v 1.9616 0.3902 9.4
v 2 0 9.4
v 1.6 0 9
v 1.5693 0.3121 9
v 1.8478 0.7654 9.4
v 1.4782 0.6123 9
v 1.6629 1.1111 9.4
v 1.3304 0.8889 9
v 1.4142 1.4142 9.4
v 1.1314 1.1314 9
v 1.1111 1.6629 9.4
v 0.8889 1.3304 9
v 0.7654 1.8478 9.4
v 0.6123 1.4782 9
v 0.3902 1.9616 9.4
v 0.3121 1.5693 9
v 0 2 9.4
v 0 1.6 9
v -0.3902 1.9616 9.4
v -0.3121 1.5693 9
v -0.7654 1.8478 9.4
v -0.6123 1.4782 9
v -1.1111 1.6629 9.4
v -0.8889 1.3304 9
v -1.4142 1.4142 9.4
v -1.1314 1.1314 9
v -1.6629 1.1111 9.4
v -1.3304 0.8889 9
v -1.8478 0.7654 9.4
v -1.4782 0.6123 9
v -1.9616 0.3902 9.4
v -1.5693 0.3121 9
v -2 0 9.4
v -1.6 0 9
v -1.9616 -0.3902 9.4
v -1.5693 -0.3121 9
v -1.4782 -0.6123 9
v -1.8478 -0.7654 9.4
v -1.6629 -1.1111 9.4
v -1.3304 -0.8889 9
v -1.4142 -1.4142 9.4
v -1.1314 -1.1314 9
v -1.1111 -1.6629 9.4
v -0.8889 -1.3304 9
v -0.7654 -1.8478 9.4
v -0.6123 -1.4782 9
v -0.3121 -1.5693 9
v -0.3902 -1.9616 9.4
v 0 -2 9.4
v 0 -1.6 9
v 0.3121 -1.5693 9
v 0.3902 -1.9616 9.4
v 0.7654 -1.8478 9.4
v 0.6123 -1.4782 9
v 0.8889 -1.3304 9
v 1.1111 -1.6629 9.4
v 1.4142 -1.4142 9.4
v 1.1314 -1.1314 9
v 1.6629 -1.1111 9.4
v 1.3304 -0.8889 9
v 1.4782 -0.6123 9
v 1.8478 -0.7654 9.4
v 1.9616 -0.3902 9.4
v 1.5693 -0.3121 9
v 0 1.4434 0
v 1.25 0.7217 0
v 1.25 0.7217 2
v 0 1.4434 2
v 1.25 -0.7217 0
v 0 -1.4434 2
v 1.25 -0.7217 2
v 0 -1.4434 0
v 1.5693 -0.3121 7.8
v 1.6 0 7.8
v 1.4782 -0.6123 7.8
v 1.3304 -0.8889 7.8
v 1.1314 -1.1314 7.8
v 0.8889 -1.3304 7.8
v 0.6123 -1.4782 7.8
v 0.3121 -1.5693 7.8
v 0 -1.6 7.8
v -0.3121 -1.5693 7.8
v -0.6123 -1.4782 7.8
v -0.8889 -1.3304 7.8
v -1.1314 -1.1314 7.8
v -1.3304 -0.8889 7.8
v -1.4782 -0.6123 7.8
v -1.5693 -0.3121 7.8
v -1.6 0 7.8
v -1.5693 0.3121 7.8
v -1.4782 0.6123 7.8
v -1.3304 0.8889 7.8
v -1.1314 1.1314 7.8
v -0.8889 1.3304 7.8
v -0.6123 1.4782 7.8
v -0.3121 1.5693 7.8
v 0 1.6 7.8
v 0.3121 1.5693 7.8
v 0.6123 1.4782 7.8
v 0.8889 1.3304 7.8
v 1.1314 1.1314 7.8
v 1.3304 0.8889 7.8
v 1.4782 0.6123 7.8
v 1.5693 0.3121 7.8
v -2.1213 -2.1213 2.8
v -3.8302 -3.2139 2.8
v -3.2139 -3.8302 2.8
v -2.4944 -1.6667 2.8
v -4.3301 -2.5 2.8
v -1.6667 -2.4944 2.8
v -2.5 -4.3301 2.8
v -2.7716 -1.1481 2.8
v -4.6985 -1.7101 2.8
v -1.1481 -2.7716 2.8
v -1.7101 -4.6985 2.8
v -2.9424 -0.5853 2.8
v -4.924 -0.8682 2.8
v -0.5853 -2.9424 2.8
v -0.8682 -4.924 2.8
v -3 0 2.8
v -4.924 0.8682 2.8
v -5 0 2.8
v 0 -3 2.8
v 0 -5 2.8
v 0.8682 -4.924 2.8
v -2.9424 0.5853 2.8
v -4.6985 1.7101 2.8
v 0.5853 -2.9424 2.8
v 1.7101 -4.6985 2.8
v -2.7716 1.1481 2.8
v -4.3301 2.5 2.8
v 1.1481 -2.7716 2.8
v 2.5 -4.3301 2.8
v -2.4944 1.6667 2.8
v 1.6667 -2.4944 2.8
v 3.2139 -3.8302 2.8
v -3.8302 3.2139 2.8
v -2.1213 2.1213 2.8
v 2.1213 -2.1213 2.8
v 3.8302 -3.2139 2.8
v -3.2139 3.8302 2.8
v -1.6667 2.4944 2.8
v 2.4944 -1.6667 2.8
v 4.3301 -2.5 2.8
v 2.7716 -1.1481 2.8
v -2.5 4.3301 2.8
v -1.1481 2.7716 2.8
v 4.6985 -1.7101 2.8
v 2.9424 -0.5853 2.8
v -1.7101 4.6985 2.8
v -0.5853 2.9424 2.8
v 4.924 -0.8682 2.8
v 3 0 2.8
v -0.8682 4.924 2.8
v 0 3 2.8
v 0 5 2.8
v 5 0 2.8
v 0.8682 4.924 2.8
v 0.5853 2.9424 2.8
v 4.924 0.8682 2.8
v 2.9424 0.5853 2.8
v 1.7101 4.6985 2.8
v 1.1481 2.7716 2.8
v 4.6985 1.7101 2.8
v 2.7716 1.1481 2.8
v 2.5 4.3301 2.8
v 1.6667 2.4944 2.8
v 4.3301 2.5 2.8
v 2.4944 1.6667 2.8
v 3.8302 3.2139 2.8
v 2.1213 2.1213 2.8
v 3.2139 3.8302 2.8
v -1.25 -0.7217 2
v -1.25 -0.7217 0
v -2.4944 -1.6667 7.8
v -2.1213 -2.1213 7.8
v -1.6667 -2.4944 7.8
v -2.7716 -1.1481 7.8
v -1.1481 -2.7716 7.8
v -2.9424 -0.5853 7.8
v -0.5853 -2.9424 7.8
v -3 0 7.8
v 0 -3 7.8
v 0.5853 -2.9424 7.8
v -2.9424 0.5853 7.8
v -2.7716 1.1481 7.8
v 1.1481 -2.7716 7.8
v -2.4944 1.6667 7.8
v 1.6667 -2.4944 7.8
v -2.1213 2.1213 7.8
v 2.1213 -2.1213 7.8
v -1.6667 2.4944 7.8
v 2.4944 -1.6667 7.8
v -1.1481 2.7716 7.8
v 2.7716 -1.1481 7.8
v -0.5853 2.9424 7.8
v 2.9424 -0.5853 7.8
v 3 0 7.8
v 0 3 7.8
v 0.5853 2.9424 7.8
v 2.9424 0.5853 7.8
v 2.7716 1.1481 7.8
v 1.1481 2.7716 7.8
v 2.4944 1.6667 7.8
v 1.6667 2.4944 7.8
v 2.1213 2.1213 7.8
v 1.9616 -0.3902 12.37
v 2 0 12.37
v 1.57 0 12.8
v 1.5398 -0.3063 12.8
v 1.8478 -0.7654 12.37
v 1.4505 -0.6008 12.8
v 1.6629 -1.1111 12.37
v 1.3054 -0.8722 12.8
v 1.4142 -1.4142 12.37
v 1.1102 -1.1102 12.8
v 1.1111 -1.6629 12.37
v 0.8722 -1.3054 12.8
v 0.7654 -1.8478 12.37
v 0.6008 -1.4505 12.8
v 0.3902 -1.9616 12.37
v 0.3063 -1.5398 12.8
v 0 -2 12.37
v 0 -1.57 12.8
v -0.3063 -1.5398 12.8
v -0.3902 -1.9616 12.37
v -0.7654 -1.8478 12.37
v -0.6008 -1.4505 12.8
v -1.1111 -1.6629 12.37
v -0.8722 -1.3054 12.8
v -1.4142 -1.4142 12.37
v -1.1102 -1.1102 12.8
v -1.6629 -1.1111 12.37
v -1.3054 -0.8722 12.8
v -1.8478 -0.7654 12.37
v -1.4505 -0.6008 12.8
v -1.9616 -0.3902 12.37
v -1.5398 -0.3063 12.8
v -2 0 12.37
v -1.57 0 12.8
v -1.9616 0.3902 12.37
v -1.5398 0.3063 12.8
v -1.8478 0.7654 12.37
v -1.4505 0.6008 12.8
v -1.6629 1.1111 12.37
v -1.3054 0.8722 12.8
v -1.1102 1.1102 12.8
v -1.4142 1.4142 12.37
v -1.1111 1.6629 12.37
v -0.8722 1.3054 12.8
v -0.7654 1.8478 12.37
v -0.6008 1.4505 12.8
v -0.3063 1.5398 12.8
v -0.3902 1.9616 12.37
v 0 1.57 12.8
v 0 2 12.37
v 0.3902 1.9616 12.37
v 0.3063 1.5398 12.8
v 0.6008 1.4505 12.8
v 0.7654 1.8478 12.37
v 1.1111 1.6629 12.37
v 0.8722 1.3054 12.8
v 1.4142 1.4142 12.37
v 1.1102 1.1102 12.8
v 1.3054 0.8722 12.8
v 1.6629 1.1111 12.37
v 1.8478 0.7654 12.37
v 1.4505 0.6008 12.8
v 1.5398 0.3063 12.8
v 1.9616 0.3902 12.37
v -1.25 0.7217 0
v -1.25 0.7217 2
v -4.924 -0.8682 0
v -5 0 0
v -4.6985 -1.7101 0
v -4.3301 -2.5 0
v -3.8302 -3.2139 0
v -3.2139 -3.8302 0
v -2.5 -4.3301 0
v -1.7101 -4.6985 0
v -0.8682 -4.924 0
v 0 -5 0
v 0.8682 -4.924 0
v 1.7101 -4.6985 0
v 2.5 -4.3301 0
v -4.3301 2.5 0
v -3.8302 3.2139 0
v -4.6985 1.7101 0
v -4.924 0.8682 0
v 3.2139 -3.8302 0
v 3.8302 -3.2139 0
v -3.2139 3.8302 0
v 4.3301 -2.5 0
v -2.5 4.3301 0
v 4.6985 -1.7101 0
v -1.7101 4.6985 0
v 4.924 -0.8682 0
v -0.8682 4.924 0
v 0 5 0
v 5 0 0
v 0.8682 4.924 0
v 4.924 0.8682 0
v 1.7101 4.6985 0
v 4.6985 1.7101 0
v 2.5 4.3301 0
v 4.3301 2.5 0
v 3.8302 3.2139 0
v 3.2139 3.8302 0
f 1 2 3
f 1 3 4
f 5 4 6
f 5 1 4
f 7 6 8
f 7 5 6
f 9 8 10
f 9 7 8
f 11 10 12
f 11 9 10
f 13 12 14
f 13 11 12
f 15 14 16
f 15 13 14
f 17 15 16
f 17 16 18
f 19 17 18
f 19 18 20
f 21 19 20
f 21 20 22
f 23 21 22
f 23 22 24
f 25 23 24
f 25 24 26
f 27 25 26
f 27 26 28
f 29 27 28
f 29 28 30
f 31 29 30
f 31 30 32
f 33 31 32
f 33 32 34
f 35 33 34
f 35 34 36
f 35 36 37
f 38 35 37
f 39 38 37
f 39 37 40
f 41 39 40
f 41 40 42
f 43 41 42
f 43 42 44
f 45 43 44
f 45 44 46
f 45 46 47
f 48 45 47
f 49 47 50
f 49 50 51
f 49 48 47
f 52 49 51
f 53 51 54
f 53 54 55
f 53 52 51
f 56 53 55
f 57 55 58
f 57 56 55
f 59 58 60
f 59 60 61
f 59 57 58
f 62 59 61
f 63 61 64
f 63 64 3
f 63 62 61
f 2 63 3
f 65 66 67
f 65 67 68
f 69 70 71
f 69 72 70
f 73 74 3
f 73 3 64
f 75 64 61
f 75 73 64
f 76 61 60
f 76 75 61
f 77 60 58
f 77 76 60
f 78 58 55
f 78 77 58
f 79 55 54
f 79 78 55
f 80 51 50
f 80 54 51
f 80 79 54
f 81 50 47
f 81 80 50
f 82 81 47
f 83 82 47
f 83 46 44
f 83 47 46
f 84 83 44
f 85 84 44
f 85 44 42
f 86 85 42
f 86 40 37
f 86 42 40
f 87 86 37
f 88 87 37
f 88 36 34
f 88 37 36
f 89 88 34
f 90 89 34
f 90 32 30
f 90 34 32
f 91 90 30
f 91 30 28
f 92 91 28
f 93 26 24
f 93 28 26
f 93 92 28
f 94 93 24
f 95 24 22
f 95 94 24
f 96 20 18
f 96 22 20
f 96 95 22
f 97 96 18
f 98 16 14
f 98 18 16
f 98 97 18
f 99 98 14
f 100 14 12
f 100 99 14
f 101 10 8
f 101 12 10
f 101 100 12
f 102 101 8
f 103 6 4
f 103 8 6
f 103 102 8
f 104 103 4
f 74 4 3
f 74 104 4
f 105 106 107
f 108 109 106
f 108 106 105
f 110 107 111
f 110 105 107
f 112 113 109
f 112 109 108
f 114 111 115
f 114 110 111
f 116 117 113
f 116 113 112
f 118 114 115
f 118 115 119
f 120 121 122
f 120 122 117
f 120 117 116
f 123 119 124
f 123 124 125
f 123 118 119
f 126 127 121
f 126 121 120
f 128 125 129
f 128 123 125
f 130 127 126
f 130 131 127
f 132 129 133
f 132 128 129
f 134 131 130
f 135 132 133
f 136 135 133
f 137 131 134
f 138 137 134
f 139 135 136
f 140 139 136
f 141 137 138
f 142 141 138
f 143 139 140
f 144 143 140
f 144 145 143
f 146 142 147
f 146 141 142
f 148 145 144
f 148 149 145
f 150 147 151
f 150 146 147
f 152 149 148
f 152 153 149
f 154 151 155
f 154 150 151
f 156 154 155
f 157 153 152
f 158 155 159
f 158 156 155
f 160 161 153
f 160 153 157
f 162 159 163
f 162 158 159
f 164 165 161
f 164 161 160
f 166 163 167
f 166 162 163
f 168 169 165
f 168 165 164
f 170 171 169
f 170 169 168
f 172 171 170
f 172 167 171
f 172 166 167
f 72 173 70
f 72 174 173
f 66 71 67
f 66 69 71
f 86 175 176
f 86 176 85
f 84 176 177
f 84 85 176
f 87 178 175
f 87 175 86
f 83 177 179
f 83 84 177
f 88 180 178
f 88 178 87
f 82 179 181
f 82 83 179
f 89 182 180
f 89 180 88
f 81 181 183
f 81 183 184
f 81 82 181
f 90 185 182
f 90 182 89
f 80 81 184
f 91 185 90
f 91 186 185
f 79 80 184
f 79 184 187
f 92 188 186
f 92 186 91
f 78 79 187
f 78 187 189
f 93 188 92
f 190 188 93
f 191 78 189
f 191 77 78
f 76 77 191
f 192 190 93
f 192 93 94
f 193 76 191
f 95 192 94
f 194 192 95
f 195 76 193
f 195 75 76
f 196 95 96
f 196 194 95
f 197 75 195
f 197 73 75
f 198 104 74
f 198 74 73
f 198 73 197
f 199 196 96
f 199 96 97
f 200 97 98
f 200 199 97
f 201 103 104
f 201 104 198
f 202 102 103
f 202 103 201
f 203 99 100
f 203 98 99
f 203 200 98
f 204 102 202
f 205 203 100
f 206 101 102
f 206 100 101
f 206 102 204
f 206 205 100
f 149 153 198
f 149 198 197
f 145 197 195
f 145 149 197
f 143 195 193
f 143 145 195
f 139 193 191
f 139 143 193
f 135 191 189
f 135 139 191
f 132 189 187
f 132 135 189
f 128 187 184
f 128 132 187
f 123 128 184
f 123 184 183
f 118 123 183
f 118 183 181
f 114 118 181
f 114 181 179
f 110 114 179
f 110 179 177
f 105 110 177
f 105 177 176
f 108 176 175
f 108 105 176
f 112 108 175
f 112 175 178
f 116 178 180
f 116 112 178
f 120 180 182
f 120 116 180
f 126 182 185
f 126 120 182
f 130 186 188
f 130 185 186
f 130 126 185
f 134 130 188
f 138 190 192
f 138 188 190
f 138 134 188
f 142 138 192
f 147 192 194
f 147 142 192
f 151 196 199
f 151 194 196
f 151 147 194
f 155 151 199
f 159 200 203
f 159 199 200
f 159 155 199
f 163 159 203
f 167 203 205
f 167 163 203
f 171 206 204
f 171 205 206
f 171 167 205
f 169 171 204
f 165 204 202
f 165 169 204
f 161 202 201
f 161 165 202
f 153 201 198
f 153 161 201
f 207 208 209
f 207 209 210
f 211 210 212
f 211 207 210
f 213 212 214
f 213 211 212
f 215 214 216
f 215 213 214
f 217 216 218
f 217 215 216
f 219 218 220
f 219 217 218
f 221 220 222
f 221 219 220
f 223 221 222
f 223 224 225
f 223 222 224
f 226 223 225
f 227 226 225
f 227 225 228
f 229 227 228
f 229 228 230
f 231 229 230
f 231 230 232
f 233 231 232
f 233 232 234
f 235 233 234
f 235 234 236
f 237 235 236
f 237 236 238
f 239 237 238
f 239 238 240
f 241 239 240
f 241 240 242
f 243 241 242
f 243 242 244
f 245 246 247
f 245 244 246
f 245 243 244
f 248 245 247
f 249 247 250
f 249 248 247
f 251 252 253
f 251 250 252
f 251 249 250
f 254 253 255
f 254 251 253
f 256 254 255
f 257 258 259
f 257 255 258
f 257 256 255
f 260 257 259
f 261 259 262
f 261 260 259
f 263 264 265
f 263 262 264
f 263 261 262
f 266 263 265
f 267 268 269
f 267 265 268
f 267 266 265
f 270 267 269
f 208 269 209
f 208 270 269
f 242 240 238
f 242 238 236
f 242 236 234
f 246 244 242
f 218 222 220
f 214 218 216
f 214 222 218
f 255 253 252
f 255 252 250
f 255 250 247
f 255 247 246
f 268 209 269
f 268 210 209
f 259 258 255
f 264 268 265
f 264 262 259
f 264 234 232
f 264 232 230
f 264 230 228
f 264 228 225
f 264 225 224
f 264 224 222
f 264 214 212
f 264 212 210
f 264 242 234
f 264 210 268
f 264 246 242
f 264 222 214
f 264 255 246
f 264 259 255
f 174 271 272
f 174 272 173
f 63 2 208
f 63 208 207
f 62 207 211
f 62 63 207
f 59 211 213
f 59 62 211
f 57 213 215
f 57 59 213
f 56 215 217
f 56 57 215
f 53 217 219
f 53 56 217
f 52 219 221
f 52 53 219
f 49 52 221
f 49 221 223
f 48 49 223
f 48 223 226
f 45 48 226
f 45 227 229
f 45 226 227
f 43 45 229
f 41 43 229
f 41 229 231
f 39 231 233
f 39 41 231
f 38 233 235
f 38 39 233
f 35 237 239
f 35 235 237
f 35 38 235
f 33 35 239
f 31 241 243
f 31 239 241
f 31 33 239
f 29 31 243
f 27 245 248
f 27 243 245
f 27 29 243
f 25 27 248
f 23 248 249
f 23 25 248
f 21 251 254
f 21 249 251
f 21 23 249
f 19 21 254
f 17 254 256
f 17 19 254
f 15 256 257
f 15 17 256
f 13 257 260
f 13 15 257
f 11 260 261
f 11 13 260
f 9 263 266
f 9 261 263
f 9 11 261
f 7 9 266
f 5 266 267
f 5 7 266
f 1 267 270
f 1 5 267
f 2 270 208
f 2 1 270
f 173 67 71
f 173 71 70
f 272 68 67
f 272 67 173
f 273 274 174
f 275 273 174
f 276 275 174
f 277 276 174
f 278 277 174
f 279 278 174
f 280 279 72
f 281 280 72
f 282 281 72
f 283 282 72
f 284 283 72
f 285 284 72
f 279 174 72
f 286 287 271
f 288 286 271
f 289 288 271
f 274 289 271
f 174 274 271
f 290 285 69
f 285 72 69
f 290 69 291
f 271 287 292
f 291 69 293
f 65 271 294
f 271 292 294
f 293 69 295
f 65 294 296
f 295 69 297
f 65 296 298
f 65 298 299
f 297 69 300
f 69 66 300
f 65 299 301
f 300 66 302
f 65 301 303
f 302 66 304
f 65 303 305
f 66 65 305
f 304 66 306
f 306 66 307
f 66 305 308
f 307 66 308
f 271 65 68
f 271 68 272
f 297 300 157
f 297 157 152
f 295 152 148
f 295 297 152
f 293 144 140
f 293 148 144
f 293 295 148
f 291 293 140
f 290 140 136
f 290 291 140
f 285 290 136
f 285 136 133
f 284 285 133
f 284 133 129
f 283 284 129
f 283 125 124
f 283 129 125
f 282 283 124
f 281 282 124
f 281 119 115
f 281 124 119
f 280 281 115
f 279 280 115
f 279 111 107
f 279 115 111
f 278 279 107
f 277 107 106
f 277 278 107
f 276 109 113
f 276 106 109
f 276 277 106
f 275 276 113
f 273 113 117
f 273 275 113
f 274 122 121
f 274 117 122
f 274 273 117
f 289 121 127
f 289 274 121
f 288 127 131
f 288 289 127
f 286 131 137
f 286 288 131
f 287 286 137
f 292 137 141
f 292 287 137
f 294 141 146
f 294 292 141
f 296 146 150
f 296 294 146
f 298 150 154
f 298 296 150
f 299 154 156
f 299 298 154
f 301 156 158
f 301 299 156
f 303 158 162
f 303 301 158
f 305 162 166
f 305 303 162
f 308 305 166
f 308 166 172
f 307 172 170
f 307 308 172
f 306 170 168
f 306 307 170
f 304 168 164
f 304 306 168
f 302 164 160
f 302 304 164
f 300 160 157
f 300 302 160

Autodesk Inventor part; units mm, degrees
ref_plane "YZ Plane" through (0, 0, 0) normal (1, 0, 0) x (0, 1, 0)
ref_plane "XZ Plane" through (0, 0, 0) normal (0, 1, 0) x (-1, 0, 0)
ref_plane "XY Plane" through (0, 0, 0) normal (0, 0, 1) x (1, 0, 0)
sketch "Sketch1" plane through (0, 0, 0) normal (0, 1, 0) x (-1, 0, 0)
  line L0 (0, 0) -> (0, 12.8)
  line L1 (0, 12.8) -> (-2, 12.8)
  line L2 (-2, 12.8) -> (-2, 9.4)
  line L3 (-3, 7.8) -> (-3, 2.8)
  line L4 (-3, 2.8) -> (-5, 2.8)
  line L5 (-5, 2.8) -> (-5, 0)
  line L6 (-5, 0) -> (0, 0)
  line L7 (-1.6, 9) -> (-1.6, 7.8)
  line L8 (-3, 7.8) -> (-1.6, 7.8)
  line L9 (-1.6, 9) -> (-2, 9.4)
  dimension "d0" = 10
  dimension "d1" = 6
  dimension "d2" = 4
  dimension "d4" = 5
  dimension "d5" = 2.8
  dimension "d15" = 5
  dimension "d16" = 3.2
  dimension "d17" = 1.2
  dimension "d18" = 45
revolve "Revolution1" add sketch "Sketch1" angle 360 about axis through (0, 0, 0) along (0, 0, 1)
thread "Thread1" size "M4x0.7" class "6g" standard "ANSI Metric M Profile" length 6
sketch "Sketch2" plane through (0, 0, 0) normal (0, 0, -1) x (-1, 0, 0)
  line L0 (0, 1.4434) -> (1.25, 0.7217)
  line L1 (1.25, 0.7217) -> (1.25, -0.7217)
  line L2 (1.25, -0.7217) -> (0, -1.4434)
  line L3 (0, -1.4434) -> (-1.25, -0.7217)
  line L4 (-1.25, -0.7217) -> (-1.25, 0.7217)
  line L5 (-1.25, 0.7217) -> (0, 1.4434)
  point P0 (0, 0)
  point P1 (0, 0)
  dimension "d9" = 2.5
extrude "Extrusion1" cut sketch "Sketch2" against normal blind 2
chamfer "Chamfer1" distance 0.43 angle 45 1 edges at (-2, 0, 12.8)
properties part number "DBTSY4-5-5-DHC-PC" material "Stainless Steel AISI 304"
